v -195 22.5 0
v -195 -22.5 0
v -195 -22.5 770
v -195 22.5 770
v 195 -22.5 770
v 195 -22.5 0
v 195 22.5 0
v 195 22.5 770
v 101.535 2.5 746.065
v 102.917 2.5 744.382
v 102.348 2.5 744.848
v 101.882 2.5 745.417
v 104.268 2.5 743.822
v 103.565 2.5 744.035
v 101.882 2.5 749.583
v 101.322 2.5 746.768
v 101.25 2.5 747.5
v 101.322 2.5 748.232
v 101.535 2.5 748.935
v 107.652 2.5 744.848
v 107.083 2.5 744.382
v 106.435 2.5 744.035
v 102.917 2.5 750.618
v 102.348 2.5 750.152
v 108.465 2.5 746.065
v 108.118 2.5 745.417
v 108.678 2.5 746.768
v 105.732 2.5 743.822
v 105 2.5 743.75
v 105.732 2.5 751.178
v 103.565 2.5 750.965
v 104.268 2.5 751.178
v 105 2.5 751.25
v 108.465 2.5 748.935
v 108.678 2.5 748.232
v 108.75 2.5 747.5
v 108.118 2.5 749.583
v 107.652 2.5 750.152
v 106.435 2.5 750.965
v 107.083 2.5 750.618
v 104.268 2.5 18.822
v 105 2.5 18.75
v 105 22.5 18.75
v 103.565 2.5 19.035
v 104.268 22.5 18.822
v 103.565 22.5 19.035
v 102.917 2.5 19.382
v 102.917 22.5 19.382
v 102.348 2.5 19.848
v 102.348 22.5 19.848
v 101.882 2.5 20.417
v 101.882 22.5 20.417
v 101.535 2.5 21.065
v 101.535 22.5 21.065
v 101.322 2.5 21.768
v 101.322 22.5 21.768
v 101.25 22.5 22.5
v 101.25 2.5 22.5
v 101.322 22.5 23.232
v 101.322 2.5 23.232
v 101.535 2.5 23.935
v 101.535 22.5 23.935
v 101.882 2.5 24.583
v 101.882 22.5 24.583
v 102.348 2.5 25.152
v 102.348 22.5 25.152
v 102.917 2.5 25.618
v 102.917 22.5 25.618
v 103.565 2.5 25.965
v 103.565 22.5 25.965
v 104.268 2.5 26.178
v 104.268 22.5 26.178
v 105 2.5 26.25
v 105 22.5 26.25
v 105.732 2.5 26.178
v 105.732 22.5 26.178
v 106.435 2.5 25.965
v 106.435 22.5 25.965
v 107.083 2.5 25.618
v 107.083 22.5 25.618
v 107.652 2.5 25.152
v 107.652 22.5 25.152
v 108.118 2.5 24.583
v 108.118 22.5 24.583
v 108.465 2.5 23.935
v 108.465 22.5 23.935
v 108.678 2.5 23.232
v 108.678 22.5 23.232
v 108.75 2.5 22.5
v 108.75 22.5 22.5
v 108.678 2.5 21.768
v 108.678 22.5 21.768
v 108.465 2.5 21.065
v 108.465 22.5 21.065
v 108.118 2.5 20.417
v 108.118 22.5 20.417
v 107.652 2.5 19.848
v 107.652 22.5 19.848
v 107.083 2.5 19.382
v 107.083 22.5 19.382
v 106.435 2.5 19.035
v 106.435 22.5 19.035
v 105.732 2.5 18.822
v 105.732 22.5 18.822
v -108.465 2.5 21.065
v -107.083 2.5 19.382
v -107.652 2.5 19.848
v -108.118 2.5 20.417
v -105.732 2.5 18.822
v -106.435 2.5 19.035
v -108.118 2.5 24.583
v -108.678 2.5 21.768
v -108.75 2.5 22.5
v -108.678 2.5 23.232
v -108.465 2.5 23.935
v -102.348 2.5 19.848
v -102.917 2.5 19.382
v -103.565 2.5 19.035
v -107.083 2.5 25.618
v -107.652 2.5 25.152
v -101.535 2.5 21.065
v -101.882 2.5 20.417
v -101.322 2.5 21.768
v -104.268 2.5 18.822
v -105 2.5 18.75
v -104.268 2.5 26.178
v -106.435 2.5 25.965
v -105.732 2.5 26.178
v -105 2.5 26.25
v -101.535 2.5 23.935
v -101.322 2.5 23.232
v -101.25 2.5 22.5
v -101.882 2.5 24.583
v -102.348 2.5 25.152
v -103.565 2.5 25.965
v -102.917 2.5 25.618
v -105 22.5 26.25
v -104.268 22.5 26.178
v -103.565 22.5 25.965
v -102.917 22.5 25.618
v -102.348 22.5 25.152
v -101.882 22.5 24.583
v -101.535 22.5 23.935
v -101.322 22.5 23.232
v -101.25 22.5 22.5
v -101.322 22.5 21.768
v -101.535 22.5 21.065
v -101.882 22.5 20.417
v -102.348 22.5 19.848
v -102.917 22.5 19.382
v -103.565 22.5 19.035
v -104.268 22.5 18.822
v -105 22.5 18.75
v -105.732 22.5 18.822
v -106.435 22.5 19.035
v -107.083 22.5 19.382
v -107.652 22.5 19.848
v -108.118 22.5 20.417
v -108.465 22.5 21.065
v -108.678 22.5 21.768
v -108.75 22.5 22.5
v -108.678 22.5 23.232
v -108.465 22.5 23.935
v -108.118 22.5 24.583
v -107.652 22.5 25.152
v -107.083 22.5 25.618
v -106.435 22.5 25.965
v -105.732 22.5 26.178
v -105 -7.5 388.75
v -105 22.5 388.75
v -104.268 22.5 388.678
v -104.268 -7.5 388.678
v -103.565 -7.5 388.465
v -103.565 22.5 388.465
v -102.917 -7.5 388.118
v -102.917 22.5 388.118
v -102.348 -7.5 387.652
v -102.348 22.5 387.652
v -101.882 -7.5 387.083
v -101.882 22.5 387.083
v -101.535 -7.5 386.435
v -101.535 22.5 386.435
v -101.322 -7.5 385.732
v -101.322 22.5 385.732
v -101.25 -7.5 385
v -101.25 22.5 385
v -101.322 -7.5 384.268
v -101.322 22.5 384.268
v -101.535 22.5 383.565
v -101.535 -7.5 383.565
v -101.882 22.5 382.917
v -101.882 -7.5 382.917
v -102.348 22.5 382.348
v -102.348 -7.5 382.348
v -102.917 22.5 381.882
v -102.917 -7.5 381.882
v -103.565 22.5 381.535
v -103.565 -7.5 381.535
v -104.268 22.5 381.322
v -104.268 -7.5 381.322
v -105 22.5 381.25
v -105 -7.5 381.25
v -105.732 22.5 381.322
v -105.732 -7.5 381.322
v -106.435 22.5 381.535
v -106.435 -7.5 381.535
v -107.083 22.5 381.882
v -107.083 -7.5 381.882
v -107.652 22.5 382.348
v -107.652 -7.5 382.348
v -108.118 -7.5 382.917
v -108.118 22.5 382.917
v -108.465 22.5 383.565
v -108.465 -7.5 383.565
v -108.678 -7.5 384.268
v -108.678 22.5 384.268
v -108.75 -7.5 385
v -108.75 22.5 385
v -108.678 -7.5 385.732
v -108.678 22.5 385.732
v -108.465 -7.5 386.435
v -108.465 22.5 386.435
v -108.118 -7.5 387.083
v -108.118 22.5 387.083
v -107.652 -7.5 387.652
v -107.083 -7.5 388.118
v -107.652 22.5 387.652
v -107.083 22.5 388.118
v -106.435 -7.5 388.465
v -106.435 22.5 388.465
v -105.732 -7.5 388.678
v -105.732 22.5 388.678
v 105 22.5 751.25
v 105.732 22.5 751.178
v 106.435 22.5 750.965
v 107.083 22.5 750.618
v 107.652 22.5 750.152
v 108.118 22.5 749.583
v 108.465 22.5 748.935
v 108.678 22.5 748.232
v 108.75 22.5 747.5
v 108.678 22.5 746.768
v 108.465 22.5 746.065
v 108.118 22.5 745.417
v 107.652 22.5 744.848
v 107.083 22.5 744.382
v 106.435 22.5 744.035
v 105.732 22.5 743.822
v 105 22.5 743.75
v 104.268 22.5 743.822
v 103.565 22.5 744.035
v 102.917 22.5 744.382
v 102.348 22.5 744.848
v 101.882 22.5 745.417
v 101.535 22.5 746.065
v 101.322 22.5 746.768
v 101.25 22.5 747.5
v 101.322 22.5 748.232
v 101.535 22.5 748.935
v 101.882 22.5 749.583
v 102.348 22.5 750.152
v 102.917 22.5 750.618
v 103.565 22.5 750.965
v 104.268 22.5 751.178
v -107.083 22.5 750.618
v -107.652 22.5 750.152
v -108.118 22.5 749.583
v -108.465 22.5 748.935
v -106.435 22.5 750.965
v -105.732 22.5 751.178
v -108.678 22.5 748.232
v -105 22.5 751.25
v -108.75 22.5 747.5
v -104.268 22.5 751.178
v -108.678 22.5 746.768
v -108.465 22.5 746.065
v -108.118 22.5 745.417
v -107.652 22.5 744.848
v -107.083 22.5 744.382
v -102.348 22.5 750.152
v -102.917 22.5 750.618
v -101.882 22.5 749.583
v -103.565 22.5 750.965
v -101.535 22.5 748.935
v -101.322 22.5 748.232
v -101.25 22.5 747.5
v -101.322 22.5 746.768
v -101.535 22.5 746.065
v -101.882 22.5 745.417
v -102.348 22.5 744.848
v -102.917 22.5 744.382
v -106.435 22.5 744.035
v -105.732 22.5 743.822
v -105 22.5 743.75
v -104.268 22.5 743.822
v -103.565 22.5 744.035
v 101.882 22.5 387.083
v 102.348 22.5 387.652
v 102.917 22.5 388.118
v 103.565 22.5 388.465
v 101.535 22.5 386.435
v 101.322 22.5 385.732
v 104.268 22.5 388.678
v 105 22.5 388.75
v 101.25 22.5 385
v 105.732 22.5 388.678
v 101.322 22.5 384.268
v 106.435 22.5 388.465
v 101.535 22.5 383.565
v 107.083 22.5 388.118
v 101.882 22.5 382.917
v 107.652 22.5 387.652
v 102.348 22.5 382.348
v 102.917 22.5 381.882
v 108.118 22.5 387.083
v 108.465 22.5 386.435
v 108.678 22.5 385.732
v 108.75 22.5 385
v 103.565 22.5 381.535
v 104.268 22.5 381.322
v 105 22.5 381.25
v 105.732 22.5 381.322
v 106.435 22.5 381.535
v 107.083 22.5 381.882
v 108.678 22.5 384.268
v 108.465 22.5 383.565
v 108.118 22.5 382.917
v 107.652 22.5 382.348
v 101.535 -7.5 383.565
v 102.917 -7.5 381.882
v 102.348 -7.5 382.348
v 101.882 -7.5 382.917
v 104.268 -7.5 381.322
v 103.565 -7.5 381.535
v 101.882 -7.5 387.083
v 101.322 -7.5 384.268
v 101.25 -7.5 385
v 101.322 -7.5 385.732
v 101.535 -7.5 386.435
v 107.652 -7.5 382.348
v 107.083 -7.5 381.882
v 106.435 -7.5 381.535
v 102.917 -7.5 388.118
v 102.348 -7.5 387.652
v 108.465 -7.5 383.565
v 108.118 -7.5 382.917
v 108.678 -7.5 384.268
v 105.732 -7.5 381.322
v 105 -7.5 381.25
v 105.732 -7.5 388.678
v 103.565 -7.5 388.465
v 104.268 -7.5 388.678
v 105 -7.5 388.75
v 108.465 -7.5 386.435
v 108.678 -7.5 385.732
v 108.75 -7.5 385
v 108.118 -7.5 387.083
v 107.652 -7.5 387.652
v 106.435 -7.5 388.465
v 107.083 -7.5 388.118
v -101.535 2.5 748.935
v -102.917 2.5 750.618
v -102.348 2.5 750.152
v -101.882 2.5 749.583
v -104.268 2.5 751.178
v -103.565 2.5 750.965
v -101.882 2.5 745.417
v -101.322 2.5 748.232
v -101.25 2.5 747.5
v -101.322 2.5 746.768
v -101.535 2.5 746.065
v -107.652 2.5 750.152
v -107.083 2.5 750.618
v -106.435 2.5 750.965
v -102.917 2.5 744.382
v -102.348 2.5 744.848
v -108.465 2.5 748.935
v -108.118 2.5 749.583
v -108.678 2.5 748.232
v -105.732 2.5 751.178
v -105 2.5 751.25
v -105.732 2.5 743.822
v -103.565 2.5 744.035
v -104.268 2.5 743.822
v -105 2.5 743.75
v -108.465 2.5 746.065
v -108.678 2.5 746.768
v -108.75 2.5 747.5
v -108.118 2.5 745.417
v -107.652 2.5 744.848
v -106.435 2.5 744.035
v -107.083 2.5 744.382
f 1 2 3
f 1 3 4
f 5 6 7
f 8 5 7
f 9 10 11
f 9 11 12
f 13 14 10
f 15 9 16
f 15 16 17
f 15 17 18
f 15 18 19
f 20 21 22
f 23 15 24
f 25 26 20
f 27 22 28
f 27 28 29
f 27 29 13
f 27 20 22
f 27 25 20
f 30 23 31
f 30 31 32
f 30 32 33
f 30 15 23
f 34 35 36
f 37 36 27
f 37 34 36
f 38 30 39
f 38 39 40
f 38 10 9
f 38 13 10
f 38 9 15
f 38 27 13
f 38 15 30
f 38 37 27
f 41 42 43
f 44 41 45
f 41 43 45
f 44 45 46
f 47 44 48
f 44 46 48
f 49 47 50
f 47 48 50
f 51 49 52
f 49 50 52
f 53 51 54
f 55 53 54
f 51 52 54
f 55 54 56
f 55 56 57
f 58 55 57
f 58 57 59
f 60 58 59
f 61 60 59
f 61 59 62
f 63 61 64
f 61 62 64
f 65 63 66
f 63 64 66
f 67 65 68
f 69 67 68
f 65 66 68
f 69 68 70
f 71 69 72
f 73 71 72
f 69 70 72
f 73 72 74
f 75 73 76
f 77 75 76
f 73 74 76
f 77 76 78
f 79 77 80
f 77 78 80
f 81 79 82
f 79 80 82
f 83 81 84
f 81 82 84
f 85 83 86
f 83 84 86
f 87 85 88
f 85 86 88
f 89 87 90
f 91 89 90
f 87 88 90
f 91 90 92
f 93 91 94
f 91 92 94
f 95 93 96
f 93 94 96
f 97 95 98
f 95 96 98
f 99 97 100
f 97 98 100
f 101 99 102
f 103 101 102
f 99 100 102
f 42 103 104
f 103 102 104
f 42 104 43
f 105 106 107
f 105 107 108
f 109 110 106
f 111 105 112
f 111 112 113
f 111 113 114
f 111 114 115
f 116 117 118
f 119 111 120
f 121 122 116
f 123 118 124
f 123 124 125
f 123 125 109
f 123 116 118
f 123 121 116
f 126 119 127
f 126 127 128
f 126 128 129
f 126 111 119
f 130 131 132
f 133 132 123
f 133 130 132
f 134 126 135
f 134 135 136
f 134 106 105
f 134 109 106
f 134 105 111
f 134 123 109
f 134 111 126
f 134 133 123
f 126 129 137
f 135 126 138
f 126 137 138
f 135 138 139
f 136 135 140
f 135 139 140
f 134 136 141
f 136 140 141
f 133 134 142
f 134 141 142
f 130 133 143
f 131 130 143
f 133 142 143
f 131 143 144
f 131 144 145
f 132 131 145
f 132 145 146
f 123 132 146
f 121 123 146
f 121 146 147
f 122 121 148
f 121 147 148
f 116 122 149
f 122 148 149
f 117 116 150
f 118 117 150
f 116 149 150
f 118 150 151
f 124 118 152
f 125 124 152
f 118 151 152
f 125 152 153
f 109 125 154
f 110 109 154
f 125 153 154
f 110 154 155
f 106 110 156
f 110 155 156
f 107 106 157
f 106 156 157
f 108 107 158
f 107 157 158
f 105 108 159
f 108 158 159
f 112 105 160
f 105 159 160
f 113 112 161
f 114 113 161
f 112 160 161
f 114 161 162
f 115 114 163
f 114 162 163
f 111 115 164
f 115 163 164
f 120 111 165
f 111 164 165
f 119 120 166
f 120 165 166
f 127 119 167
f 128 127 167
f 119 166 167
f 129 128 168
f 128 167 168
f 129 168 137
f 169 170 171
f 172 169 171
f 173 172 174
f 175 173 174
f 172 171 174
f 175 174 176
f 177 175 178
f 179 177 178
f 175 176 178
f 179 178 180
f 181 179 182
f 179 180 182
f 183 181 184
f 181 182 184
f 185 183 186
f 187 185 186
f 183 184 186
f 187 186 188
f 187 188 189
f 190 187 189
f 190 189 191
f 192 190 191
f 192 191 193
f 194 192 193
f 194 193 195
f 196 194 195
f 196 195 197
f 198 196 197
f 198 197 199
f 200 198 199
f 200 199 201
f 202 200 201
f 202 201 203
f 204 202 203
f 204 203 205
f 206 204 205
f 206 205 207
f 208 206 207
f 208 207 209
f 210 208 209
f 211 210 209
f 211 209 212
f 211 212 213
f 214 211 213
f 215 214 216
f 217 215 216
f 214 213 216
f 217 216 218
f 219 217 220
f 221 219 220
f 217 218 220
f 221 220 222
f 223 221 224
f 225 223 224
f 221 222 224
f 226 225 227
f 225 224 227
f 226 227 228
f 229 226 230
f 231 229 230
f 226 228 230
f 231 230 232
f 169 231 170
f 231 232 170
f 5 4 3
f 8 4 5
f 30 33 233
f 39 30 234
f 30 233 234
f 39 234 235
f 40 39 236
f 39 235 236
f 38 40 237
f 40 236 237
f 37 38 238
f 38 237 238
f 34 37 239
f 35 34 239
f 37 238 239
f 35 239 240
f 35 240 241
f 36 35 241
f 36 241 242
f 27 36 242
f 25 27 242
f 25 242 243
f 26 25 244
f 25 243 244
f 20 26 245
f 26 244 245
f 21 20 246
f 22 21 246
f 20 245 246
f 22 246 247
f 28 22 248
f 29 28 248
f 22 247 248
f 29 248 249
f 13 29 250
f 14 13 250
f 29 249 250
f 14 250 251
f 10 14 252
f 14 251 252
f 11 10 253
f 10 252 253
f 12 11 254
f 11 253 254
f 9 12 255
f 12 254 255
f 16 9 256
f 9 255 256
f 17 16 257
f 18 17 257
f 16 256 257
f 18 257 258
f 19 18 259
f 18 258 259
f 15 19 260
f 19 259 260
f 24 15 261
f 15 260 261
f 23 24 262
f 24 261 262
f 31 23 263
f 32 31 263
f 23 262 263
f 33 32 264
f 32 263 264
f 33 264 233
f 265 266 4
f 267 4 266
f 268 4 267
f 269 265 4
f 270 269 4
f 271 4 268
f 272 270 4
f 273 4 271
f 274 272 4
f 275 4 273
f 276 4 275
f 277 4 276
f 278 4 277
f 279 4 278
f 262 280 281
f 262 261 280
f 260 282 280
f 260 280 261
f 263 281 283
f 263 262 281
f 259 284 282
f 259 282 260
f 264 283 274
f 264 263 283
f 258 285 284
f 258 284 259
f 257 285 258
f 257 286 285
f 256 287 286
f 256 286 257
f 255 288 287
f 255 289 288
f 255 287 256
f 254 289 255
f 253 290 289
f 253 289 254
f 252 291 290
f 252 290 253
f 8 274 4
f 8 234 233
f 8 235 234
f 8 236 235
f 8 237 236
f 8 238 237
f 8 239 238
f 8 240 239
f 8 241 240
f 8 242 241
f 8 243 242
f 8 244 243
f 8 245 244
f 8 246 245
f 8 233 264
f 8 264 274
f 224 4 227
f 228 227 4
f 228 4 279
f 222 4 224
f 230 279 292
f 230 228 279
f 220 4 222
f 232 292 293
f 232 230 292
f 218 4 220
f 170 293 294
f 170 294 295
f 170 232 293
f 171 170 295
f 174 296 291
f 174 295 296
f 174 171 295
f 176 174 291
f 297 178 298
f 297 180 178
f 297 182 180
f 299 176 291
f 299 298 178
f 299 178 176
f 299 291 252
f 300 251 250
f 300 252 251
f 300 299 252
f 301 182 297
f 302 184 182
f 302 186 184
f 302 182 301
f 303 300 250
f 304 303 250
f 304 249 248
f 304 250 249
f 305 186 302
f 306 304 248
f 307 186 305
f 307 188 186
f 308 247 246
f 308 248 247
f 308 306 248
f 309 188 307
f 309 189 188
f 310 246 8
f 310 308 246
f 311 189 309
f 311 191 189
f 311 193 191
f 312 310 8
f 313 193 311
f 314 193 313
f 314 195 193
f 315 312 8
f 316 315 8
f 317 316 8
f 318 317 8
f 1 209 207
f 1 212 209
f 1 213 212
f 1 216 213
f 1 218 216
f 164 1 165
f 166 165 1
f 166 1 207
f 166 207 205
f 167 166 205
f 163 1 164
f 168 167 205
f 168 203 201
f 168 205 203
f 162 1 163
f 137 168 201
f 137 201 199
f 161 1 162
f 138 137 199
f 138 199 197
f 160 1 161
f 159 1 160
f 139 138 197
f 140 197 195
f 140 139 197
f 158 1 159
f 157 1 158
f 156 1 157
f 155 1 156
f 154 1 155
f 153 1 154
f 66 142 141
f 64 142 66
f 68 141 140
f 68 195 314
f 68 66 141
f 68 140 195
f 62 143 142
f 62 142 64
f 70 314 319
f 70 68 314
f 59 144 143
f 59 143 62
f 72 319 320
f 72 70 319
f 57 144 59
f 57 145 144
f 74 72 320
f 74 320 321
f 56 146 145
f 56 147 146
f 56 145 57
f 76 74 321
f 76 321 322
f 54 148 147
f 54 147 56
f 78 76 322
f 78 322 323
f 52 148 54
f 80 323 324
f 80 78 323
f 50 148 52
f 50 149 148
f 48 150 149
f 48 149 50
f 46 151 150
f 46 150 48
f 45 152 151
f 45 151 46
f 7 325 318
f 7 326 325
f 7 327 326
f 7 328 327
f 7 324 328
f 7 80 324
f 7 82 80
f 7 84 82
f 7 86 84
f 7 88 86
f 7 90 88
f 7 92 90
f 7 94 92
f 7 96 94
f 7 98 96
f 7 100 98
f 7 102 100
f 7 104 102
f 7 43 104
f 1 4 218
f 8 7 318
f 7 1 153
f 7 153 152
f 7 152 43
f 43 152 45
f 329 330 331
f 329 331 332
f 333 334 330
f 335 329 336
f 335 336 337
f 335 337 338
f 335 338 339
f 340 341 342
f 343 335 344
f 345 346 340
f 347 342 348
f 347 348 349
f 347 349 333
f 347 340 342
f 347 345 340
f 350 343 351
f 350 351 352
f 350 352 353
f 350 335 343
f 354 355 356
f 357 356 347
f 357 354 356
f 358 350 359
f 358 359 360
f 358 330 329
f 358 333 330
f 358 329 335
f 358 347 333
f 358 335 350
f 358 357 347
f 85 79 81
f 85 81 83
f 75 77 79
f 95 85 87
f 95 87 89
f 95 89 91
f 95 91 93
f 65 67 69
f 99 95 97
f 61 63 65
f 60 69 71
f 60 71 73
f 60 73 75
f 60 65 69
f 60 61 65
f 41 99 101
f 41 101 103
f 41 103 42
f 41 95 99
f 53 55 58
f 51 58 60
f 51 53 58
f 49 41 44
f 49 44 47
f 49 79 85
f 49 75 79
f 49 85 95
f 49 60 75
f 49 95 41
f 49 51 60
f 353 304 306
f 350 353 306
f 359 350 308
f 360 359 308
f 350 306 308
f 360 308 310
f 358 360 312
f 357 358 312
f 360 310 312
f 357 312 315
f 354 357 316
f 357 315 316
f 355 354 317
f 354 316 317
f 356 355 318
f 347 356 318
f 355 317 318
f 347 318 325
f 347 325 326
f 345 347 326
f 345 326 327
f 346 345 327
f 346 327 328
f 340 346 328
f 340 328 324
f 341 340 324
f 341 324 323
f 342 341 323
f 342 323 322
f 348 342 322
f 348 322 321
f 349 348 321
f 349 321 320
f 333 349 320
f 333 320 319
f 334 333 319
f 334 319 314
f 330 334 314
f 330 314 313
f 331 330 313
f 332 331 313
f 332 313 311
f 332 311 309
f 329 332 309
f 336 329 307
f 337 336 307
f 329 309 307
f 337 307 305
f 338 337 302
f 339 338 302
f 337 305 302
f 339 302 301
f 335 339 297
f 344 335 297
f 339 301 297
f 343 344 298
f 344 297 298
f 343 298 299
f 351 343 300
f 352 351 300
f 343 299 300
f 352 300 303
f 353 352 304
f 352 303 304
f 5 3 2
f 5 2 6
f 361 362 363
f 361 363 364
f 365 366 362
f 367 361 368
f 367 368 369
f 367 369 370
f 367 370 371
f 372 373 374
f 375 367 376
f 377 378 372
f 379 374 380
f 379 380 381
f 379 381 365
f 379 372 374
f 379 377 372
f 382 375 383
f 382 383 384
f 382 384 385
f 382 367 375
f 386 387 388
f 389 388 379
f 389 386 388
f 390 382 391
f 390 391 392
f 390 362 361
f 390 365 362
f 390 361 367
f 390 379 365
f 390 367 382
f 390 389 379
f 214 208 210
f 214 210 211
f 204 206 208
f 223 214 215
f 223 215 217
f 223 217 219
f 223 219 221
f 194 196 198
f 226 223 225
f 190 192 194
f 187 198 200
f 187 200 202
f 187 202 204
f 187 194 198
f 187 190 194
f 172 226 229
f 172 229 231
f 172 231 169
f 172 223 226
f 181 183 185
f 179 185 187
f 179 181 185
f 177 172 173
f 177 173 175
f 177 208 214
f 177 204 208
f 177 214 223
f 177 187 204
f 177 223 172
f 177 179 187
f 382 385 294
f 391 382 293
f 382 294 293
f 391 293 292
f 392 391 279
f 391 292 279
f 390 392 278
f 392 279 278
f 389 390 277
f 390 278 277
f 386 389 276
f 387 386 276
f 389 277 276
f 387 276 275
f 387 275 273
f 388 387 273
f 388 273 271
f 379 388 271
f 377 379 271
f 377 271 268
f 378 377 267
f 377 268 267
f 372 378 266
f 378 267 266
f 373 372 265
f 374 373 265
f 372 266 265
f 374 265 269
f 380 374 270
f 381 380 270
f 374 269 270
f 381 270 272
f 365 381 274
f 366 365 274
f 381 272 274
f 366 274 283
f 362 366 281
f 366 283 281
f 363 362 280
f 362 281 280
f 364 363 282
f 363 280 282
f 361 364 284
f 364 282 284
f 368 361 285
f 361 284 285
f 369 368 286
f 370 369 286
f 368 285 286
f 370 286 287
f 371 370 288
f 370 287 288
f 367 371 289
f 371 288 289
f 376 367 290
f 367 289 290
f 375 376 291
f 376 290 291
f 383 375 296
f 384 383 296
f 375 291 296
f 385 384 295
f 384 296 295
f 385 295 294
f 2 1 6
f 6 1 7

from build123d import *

# Parameters (mm, degrees)
ESQUISSE1_W             = 390
ESQUISSE1_H             = 45
BOSS_EXTRU_1_DEPTH      = 770
ESQUISSE2_R             = 3.75
ENL_V_MAT_EXTRU_1_DEPTH = 20
ESQUISSE3_R             = 3.75
ENL_V_MAT_EXTRU_2_DEPTH = 30


with BuildPart() as part:
    # Esquisse1 → Boss.-Extru.1 (new body)
    with BuildSketch(Plane.XY):
        Rectangle(ESQUISSE1_W, ESQUISSE1_H)
    extrude(amount=BOSS_EXTRU_1_DEPTH)

    # Esquisse2 → Enlèv. mat.-Extru.1 (cut)
    with BuildSketch(Plane(origin=(0, 22.5, 0), x_dir=(1, 0, 0), z_dir=(0, 1, 0))):
        with Locations(Location((-105, -22.5, 0), (0, 0, 270))):
            Circle(ESQUISSE2_R)
        with Locations(Location((105, -22.5, 0), (0, 0, 90))):
            Circle(ESQUISSE2_R)
        with Locations(Location((105, -747.5, 0), (0, 0, 270))):
            Circle(ESQUISSE2_R)
        with Locations(Location((-105, -747.5, 0), (0, 0, 90))):
            Circle(ESQUISSE2_R)
        with Locations(Location((-105, -385, 0), (0, 0, 270))):
            Circle(ESQUISSE2_R)
        with Locations(Location((105, -385, 0), (0, 0, 270))):
            Circle(ESQUISSE2_R)
    extrude(amount=-ENL_V_MAT_EXTRU_1_DEPTH, mode=Mode.SUBTRACT)

    # Esquisse3 → Enlèv. mat.-Extru.2 (cut)
    with BuildSketch(Plane(origin=(0, 22.5, 0), x_dir=(1, 0, 0), z_dir=(0, 1, 0))):
        with Locations(Location((-105, -385, 0), (0, 0, 270))):
            Circle(ESQUISSE3_R)
        with Locations(Location((105, -385, 0), (0, 0, 270))):
            Circle(ESQUISSE3_R)
    extrude(amount=-ENL_V_MAT_EXTRU_2_DEPTH, mode=Mode.SUBTRACT)


solid = part.part
